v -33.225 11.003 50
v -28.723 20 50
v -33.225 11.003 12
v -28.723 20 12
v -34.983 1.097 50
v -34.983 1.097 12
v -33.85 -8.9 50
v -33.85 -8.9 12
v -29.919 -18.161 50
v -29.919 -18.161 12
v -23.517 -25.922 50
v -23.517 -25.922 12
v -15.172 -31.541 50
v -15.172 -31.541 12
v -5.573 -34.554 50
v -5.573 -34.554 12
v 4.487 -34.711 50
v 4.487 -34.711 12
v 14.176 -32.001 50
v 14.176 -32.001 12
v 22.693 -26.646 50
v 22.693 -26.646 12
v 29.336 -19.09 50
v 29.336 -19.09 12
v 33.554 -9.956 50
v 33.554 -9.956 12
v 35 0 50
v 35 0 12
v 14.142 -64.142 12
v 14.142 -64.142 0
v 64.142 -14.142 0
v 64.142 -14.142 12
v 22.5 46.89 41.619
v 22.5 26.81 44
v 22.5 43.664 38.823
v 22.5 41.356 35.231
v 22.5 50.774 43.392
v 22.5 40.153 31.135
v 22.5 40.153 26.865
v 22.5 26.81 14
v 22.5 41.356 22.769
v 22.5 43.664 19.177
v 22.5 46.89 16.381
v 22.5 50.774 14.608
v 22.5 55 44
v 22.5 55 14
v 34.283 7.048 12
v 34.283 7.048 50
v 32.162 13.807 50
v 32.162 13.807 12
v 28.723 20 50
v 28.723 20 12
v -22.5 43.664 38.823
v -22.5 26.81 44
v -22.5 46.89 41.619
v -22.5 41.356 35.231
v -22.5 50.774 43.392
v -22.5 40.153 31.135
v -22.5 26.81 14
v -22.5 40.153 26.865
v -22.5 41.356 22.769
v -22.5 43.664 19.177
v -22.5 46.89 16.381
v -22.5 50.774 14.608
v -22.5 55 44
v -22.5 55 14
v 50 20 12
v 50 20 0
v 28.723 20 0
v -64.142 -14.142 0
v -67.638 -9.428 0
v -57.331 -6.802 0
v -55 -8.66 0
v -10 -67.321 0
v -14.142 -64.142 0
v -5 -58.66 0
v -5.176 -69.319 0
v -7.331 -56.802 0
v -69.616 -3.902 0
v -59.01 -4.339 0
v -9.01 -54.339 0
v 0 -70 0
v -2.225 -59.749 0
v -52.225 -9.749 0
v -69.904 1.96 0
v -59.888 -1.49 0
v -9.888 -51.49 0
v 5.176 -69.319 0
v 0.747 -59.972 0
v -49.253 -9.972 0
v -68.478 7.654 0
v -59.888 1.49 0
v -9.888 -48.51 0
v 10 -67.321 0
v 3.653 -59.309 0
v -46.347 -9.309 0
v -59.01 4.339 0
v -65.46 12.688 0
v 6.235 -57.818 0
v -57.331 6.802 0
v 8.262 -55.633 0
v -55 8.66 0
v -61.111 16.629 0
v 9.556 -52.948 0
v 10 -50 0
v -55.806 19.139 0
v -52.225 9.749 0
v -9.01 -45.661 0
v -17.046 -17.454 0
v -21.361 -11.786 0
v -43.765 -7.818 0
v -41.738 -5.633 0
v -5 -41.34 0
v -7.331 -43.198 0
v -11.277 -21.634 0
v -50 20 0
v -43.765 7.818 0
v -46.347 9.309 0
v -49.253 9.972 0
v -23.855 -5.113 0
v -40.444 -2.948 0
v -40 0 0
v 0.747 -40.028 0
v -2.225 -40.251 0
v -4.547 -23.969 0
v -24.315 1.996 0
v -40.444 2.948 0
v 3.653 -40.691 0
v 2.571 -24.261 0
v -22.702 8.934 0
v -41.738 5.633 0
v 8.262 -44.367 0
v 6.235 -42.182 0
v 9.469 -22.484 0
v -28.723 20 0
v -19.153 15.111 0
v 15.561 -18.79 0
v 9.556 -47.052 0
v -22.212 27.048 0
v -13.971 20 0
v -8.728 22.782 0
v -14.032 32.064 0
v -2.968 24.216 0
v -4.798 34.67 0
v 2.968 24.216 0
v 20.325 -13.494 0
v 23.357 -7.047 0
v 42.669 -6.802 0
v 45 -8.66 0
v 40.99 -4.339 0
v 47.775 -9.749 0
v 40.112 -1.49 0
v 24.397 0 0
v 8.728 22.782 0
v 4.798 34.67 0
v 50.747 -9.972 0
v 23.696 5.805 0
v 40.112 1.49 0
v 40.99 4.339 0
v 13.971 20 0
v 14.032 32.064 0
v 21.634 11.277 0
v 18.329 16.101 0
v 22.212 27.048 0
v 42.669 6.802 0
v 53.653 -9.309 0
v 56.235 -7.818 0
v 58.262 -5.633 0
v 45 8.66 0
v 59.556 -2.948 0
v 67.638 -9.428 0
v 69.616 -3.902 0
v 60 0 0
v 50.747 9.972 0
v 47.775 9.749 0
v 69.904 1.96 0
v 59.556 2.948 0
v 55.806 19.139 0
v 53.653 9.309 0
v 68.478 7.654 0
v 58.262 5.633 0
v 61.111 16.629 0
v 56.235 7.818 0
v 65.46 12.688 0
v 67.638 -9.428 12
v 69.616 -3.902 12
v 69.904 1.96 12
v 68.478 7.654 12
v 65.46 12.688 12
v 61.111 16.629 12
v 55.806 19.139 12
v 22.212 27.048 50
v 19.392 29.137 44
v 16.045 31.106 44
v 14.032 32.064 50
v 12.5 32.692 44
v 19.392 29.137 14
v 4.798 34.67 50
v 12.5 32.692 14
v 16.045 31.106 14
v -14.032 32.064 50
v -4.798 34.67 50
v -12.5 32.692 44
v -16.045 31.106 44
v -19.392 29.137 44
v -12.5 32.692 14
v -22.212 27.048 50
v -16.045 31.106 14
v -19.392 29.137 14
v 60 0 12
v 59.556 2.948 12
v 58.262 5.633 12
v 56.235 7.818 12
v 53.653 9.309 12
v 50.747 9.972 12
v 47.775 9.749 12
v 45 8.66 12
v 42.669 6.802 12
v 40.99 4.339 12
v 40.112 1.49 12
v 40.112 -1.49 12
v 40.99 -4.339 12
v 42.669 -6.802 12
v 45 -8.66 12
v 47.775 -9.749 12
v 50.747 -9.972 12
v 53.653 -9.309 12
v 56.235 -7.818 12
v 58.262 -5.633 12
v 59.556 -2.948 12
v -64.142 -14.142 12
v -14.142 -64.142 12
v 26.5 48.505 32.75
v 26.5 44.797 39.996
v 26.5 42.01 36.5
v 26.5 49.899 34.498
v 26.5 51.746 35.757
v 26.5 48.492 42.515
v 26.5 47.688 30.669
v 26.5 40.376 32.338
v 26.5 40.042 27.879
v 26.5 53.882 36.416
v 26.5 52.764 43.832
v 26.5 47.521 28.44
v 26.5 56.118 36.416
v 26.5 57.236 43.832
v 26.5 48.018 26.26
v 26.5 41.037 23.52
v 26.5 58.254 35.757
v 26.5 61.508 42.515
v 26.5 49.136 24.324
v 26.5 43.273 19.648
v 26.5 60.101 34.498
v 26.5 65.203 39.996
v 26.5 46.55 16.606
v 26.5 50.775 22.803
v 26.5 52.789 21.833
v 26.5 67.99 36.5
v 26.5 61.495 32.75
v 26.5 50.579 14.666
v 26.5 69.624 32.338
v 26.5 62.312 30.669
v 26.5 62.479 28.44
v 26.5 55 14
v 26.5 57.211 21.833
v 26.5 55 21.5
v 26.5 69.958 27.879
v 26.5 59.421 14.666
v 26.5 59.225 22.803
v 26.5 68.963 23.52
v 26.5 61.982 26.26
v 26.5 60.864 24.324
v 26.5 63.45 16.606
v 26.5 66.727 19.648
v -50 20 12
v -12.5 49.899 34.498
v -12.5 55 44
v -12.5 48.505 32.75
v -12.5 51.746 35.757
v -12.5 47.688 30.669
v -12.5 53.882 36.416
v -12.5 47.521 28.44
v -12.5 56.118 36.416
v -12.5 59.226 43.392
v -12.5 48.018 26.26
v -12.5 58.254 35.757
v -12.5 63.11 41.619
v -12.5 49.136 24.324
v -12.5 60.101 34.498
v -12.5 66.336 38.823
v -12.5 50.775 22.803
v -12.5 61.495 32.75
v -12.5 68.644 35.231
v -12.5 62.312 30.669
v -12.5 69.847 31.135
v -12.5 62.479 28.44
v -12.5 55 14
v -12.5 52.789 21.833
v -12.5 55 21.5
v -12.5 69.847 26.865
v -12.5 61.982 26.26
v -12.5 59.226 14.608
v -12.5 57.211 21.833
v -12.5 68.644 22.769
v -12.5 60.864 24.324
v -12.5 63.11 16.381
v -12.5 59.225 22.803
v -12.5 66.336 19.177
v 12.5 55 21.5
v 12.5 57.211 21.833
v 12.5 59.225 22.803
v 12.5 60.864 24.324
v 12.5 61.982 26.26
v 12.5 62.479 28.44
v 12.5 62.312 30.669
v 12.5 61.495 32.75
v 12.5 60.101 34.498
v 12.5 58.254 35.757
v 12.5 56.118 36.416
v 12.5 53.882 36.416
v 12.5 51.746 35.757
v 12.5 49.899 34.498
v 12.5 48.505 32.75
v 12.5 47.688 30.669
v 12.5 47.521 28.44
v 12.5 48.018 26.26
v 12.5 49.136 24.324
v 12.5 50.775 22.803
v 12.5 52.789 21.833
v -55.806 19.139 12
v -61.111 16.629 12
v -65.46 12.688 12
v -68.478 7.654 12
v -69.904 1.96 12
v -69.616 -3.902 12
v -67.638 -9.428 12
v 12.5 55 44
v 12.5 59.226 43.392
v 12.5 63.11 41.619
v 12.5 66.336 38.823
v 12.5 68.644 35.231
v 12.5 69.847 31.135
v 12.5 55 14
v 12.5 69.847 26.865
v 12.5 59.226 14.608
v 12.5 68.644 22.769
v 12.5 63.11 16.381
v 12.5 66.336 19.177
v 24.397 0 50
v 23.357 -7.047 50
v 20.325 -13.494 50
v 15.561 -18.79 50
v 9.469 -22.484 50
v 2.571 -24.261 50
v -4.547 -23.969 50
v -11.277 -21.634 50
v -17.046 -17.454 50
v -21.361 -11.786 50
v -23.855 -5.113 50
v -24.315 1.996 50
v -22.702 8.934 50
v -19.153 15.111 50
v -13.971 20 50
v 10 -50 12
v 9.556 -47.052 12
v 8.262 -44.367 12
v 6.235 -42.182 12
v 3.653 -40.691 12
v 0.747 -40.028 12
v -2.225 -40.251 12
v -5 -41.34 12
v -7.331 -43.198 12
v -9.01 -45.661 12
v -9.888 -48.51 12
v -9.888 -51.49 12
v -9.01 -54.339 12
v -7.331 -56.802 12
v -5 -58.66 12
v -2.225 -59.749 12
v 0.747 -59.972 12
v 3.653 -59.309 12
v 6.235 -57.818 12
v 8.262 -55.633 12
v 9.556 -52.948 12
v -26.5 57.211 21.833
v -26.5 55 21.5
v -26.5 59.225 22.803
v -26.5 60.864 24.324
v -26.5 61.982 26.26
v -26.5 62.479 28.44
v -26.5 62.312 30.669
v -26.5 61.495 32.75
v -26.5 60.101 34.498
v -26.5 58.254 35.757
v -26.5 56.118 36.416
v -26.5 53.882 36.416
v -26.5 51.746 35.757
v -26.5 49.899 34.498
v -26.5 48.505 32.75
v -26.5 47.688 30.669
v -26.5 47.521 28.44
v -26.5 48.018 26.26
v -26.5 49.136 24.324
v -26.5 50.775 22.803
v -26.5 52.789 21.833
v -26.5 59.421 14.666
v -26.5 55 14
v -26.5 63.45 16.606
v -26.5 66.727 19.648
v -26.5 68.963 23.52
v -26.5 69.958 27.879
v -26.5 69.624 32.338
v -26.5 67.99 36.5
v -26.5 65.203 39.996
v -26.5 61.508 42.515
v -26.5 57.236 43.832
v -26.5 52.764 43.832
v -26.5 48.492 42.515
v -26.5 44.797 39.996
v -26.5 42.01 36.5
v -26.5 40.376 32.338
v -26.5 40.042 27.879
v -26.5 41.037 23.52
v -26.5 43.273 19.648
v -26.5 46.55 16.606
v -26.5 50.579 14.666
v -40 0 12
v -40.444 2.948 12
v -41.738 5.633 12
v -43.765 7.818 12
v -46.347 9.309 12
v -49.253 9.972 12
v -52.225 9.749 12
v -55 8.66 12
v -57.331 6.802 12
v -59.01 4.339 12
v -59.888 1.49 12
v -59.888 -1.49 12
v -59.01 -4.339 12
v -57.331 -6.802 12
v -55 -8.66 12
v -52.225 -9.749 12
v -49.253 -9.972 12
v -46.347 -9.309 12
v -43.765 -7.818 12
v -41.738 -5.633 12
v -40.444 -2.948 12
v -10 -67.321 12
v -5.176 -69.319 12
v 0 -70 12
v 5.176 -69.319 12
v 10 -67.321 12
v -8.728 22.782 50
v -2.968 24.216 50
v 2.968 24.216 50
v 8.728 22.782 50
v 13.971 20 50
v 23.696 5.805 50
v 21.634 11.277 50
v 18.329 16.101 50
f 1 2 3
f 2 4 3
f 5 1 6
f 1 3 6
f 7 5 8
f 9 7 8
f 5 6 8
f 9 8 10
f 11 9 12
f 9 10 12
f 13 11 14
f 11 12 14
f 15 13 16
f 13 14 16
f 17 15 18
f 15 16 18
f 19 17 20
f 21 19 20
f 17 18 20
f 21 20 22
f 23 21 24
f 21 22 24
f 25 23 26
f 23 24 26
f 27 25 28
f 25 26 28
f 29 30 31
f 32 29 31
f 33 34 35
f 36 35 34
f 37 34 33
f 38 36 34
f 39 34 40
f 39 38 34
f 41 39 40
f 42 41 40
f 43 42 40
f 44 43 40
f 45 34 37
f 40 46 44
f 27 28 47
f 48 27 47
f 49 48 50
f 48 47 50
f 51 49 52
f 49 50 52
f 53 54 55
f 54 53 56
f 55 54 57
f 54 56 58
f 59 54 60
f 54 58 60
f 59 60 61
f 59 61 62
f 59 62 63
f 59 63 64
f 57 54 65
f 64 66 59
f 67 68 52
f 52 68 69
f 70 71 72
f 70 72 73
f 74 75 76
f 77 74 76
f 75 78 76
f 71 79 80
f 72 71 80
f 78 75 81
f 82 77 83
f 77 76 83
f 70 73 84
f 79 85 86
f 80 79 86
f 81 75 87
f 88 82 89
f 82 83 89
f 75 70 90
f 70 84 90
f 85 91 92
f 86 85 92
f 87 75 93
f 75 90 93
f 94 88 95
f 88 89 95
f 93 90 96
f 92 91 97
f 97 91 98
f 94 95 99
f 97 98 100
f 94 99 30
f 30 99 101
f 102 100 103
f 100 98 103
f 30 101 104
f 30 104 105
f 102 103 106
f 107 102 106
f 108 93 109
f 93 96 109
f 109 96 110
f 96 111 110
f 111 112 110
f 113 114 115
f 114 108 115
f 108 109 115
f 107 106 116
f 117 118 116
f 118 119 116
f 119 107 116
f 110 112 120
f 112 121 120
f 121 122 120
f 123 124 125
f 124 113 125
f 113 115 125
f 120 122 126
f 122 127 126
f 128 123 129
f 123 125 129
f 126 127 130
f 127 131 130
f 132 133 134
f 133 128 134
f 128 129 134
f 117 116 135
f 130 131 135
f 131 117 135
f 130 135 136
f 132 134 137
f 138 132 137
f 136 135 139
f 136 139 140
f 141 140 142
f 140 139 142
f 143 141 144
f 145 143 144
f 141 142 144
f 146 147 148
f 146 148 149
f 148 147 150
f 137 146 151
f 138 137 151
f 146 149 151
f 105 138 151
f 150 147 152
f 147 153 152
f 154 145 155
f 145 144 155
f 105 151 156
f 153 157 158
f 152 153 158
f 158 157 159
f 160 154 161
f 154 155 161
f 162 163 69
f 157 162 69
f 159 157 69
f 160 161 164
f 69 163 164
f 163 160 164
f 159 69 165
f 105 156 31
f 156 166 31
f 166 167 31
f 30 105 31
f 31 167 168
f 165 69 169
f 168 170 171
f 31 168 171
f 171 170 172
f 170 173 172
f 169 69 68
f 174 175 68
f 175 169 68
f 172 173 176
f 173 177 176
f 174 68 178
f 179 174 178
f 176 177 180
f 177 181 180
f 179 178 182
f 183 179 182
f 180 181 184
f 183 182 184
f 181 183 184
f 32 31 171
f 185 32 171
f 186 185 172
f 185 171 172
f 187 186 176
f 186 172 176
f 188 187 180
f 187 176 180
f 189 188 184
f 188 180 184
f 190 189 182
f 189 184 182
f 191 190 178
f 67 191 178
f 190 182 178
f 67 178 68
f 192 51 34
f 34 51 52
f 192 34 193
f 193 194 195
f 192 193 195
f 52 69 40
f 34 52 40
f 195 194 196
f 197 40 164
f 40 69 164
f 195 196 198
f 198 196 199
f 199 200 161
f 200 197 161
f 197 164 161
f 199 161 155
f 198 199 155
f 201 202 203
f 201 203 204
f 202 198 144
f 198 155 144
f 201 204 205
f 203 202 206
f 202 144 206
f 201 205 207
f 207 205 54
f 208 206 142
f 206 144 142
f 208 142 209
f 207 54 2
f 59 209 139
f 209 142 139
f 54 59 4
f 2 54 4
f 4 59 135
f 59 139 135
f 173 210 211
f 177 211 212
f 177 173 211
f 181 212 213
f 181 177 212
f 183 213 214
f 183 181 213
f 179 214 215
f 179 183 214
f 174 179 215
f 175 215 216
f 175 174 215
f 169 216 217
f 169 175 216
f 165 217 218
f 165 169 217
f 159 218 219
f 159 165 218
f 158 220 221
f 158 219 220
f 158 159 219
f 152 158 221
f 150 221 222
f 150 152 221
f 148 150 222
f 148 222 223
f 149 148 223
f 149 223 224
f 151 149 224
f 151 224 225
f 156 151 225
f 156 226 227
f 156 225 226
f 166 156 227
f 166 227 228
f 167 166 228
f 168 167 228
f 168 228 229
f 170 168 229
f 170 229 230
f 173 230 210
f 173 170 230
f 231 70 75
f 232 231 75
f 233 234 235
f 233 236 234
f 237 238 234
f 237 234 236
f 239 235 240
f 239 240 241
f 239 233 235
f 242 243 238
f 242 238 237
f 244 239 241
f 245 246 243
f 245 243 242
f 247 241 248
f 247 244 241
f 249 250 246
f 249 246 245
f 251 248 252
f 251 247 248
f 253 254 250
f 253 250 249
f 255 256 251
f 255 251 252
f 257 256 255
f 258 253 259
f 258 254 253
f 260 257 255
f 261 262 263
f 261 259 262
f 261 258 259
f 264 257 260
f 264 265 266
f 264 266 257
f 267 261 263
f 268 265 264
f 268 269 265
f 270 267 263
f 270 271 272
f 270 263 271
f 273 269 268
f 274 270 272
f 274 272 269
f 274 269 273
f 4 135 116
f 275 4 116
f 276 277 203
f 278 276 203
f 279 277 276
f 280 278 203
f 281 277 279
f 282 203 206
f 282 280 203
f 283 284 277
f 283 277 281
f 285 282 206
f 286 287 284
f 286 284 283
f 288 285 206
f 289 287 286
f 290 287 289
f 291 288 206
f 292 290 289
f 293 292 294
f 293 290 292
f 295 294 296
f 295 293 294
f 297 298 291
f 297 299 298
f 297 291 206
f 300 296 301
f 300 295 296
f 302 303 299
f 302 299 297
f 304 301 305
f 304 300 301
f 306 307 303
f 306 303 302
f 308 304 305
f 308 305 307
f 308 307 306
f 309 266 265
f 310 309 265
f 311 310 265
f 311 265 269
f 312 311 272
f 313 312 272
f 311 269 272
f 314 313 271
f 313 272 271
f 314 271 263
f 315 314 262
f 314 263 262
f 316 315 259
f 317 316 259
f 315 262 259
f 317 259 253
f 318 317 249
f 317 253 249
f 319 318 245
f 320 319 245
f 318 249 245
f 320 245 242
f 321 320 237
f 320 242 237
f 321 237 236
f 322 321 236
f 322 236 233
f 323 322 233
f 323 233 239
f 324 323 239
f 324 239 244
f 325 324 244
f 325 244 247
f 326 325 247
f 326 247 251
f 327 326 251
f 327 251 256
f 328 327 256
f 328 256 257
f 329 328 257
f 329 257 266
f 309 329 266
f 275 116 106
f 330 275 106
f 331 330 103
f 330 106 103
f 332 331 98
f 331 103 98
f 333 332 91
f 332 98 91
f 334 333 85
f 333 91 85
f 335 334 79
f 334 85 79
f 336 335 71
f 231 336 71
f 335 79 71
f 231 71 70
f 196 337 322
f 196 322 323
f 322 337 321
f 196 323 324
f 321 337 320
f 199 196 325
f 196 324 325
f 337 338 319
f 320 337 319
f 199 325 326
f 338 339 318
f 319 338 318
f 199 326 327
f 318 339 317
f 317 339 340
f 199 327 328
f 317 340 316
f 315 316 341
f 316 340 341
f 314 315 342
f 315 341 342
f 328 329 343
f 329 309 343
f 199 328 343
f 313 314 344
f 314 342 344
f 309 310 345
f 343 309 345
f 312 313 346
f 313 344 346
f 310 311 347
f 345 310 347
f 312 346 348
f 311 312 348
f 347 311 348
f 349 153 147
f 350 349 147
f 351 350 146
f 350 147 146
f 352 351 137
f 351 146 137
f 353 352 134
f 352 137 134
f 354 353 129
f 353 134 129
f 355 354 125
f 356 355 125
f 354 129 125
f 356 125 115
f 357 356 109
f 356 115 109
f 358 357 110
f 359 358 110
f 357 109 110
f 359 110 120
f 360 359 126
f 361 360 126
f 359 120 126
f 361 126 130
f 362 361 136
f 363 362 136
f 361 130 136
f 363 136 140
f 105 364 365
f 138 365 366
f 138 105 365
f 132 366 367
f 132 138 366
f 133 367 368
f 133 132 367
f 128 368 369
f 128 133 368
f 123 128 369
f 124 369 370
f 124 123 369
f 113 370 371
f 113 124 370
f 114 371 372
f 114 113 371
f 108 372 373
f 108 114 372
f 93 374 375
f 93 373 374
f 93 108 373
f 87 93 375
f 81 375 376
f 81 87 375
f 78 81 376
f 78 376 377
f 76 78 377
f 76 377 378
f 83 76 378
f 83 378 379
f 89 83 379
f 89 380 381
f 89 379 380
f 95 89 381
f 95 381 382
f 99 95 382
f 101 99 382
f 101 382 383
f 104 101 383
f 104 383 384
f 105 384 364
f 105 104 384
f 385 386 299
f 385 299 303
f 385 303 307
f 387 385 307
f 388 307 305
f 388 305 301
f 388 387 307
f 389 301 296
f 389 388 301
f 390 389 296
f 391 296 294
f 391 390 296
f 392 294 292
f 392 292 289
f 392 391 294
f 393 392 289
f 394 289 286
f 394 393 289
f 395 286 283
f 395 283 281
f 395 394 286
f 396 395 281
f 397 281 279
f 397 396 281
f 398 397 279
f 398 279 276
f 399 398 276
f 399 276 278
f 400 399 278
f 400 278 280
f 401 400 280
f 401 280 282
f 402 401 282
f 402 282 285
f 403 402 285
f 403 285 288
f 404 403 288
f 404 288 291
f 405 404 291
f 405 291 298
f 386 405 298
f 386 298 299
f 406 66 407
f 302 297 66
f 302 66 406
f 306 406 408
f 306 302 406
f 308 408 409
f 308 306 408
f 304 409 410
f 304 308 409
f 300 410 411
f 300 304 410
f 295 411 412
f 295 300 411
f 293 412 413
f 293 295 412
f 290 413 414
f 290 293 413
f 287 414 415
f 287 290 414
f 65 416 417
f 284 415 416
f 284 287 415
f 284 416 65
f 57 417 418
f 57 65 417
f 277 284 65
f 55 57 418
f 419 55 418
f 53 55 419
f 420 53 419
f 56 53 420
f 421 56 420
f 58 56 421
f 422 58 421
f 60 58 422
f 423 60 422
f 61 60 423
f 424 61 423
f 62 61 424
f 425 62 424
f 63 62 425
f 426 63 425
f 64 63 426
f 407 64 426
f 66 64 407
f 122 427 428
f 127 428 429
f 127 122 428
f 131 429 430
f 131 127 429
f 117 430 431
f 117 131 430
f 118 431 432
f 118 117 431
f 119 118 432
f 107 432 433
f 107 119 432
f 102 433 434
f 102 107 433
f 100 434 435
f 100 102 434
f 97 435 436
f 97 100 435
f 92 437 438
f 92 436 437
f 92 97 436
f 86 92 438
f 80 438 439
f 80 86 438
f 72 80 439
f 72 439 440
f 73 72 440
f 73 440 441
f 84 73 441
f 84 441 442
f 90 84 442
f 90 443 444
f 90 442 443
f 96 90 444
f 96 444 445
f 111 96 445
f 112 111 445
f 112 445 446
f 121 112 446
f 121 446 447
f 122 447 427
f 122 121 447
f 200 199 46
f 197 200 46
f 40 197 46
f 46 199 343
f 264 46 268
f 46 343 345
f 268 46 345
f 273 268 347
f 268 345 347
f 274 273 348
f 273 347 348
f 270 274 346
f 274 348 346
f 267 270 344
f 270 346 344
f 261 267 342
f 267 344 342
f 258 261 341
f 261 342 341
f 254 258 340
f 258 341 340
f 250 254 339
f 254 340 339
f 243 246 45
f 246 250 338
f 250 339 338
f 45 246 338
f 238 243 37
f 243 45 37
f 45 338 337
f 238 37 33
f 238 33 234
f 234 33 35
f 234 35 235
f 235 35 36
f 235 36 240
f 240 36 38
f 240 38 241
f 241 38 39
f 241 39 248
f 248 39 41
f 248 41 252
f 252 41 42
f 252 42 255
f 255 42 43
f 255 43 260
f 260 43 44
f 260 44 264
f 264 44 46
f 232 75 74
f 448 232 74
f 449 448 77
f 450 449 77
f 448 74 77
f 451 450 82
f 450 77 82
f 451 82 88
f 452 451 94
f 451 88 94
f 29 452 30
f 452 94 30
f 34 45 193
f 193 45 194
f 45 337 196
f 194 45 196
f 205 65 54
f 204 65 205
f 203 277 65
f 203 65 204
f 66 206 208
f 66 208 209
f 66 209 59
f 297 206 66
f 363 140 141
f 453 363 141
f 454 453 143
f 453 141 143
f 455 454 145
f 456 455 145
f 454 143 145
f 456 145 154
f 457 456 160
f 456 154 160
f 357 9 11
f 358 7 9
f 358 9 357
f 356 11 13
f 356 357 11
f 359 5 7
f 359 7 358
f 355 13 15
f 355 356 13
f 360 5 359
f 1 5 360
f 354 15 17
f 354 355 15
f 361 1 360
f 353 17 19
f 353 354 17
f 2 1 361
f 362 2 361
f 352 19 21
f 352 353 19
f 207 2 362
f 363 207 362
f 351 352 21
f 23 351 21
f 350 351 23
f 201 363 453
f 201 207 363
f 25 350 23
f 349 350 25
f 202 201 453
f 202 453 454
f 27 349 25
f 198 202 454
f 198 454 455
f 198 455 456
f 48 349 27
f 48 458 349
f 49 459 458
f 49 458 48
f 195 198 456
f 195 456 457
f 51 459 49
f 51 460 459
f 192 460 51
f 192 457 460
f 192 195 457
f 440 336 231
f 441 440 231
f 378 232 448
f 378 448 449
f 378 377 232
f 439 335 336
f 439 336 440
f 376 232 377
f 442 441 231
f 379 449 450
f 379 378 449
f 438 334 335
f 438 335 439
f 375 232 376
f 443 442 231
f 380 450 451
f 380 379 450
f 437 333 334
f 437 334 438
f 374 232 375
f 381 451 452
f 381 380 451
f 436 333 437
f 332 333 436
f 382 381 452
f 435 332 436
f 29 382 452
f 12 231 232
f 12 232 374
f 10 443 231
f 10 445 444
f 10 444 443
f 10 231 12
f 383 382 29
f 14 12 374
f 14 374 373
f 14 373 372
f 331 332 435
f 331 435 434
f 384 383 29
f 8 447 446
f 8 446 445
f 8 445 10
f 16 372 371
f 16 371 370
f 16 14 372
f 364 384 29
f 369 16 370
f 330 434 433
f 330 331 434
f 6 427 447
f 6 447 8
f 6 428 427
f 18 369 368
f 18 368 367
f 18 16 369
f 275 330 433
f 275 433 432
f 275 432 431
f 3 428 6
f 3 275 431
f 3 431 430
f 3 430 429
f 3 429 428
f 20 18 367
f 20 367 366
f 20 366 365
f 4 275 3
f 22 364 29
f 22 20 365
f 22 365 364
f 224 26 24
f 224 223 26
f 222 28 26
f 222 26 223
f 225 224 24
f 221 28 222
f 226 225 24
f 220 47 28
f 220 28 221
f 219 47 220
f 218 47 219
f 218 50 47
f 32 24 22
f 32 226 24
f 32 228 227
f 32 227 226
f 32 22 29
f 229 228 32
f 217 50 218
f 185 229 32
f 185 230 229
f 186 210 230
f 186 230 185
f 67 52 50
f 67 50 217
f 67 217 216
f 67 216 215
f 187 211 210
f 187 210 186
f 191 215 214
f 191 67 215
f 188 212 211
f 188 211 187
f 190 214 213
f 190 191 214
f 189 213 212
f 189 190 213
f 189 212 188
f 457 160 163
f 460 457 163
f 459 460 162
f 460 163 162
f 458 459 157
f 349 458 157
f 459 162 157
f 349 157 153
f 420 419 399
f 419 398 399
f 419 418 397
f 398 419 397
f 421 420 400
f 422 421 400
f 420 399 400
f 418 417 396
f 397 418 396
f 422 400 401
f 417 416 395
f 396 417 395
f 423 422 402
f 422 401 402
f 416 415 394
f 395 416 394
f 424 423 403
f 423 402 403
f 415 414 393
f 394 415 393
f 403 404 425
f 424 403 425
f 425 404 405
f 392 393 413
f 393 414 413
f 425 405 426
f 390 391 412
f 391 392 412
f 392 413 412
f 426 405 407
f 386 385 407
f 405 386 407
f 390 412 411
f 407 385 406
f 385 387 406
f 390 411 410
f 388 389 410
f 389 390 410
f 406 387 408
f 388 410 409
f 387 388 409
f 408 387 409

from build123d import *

# Parameters (mm, degrees)
SKETCH1_R                = 10
BOSS_EXTRUDE1_DEPTH      = 12
SKETCH1_3_R              = 35
SKETCH1_3_R_2            = 24.39675389
BOSS_EXTRUDE2_DEPTH      = 50
BOSS_EXTRUDE3_START      = 12.5
BOSS_EXTRUDE3_DEPTH      = 10
BOSS_EXTRUDE4_DEPTH      = 4
BOSS_EXTRUDE4_DEPTH_BACK = 10
SKETCH3_R                = 15
SKETCH4_R                = 7.5
CUT_EXTRUDE1_DEPTH       = 130.275867818


with BuildPart() as part:
    # Sketch1 → Boss-Extrude1 (new body)
    with BuildSketch(Plane.XY):
        with BuildLine():
            Line((-28.722813233, 20), (-50, 20))
            ThreePointArc((-50, 20), (-68.47759065, 7.653668647), (-64.142135624, -14.142135624))
            Line((-64.142135624, -14.142135624), (-14.142135624, -64.142135624))
            ThreePointArc((-14.142135624, -64.142135624), (0, -70), (14.142135624, -64.142135624))
            Line((14.142135624, -64.142135624), (64.142135624, -14.142135624))
            ThreePointArc((64.142135624, -14.142135624), (68.47759065, 7.653668647), (50, 20))
            Line((50, 20), (28.722813233, 20))
            ThreePointArc((28.722813233, 20), (33.393850206, 10.480971731), (35, 0))
            ThreePointArc((35, 0), (-10.480971731, -33.393850206), (-28.722813233, 20))
        make_face()
        with Locations((0, -50)):
            Circle(SKETCH1_R, mode=Mode.SUBTRACT)
        with Locations((-50, 0)):
            Circle(SKETCH1_R, mode=Mode.SUBTRACT)
        with Locations((50, 0)):
            Circle(SKETCH1_R, mode=Mode.SUBTRACT)
    extrude(amount=BOSS_EXTRUDE1_DEPTH)

    # Sketch1<3> → Boss-Extrude2 (add)
    with BuildSketch(Plane.XY):
        Circle(SKETCH1_3_R)
        Circle(SKETCH1_3_R_2, mode=Mode.SUBTRACT)
    extrude(amount=BOSS_EXTRUDE2_DEPTH)

    # Sketch2 → Boss-Extrude3 (add)
    with BuildSketch(Plane(origin=(0, 0, 0), x_dir=(0, 0, -1), z_dir=(1, 0, 0)).offset(BOSS_EXTRUDE3_START)):
        Polygon((-44, 35), (-44, 26.042981562), (-14, 26.042981562), (-14, 55), (-44, 55), align=None)
    extrude(amount=BOSS_EXTRUDE3_DEPTH)

    # Sketch3 → Boss-Extrude4 (add, two sides: drawn at the far end of the back side and taken through both)
    with BuildSketch(Plane(origin=(22.5, 0, 0), x_dir=(0, 0, -1), z_dir=(1, 0, 0)).offset(-BOSS_EXTRUDE4_DEPTH_BACK)):
        with Locations((-29, 55)):
            Circle(SKETCH3_R)
    extrude(amount=BOSS_EXTRUDE4_DEPTH + BOSS_EXTRUDE4_DEPTH_BACK)

    # Sketch4 → Cut-Extrude1 (cut, through all)
    with BuildSketch(Plane(origin=(26.5, 0, 0), x_dir=(0, 0, -1), z_dir=(1, 0, 0))):
        with Locations((-29, 55)):
            Circle(SKETCH4_R)
    extrude(amount=-CUT_EXTRUDE1_DEPTH, mode=Mode.SUBTRACT)

    # Mirror1: part across plane


with BuildPart() as part_1:
    add(part.part)
    add(part.part.mirror(Plane(origin=(0, 0, 0), x_dir=(0, 0, 1), z_dir=(1, 0, 0))))


solid = part_1.part
